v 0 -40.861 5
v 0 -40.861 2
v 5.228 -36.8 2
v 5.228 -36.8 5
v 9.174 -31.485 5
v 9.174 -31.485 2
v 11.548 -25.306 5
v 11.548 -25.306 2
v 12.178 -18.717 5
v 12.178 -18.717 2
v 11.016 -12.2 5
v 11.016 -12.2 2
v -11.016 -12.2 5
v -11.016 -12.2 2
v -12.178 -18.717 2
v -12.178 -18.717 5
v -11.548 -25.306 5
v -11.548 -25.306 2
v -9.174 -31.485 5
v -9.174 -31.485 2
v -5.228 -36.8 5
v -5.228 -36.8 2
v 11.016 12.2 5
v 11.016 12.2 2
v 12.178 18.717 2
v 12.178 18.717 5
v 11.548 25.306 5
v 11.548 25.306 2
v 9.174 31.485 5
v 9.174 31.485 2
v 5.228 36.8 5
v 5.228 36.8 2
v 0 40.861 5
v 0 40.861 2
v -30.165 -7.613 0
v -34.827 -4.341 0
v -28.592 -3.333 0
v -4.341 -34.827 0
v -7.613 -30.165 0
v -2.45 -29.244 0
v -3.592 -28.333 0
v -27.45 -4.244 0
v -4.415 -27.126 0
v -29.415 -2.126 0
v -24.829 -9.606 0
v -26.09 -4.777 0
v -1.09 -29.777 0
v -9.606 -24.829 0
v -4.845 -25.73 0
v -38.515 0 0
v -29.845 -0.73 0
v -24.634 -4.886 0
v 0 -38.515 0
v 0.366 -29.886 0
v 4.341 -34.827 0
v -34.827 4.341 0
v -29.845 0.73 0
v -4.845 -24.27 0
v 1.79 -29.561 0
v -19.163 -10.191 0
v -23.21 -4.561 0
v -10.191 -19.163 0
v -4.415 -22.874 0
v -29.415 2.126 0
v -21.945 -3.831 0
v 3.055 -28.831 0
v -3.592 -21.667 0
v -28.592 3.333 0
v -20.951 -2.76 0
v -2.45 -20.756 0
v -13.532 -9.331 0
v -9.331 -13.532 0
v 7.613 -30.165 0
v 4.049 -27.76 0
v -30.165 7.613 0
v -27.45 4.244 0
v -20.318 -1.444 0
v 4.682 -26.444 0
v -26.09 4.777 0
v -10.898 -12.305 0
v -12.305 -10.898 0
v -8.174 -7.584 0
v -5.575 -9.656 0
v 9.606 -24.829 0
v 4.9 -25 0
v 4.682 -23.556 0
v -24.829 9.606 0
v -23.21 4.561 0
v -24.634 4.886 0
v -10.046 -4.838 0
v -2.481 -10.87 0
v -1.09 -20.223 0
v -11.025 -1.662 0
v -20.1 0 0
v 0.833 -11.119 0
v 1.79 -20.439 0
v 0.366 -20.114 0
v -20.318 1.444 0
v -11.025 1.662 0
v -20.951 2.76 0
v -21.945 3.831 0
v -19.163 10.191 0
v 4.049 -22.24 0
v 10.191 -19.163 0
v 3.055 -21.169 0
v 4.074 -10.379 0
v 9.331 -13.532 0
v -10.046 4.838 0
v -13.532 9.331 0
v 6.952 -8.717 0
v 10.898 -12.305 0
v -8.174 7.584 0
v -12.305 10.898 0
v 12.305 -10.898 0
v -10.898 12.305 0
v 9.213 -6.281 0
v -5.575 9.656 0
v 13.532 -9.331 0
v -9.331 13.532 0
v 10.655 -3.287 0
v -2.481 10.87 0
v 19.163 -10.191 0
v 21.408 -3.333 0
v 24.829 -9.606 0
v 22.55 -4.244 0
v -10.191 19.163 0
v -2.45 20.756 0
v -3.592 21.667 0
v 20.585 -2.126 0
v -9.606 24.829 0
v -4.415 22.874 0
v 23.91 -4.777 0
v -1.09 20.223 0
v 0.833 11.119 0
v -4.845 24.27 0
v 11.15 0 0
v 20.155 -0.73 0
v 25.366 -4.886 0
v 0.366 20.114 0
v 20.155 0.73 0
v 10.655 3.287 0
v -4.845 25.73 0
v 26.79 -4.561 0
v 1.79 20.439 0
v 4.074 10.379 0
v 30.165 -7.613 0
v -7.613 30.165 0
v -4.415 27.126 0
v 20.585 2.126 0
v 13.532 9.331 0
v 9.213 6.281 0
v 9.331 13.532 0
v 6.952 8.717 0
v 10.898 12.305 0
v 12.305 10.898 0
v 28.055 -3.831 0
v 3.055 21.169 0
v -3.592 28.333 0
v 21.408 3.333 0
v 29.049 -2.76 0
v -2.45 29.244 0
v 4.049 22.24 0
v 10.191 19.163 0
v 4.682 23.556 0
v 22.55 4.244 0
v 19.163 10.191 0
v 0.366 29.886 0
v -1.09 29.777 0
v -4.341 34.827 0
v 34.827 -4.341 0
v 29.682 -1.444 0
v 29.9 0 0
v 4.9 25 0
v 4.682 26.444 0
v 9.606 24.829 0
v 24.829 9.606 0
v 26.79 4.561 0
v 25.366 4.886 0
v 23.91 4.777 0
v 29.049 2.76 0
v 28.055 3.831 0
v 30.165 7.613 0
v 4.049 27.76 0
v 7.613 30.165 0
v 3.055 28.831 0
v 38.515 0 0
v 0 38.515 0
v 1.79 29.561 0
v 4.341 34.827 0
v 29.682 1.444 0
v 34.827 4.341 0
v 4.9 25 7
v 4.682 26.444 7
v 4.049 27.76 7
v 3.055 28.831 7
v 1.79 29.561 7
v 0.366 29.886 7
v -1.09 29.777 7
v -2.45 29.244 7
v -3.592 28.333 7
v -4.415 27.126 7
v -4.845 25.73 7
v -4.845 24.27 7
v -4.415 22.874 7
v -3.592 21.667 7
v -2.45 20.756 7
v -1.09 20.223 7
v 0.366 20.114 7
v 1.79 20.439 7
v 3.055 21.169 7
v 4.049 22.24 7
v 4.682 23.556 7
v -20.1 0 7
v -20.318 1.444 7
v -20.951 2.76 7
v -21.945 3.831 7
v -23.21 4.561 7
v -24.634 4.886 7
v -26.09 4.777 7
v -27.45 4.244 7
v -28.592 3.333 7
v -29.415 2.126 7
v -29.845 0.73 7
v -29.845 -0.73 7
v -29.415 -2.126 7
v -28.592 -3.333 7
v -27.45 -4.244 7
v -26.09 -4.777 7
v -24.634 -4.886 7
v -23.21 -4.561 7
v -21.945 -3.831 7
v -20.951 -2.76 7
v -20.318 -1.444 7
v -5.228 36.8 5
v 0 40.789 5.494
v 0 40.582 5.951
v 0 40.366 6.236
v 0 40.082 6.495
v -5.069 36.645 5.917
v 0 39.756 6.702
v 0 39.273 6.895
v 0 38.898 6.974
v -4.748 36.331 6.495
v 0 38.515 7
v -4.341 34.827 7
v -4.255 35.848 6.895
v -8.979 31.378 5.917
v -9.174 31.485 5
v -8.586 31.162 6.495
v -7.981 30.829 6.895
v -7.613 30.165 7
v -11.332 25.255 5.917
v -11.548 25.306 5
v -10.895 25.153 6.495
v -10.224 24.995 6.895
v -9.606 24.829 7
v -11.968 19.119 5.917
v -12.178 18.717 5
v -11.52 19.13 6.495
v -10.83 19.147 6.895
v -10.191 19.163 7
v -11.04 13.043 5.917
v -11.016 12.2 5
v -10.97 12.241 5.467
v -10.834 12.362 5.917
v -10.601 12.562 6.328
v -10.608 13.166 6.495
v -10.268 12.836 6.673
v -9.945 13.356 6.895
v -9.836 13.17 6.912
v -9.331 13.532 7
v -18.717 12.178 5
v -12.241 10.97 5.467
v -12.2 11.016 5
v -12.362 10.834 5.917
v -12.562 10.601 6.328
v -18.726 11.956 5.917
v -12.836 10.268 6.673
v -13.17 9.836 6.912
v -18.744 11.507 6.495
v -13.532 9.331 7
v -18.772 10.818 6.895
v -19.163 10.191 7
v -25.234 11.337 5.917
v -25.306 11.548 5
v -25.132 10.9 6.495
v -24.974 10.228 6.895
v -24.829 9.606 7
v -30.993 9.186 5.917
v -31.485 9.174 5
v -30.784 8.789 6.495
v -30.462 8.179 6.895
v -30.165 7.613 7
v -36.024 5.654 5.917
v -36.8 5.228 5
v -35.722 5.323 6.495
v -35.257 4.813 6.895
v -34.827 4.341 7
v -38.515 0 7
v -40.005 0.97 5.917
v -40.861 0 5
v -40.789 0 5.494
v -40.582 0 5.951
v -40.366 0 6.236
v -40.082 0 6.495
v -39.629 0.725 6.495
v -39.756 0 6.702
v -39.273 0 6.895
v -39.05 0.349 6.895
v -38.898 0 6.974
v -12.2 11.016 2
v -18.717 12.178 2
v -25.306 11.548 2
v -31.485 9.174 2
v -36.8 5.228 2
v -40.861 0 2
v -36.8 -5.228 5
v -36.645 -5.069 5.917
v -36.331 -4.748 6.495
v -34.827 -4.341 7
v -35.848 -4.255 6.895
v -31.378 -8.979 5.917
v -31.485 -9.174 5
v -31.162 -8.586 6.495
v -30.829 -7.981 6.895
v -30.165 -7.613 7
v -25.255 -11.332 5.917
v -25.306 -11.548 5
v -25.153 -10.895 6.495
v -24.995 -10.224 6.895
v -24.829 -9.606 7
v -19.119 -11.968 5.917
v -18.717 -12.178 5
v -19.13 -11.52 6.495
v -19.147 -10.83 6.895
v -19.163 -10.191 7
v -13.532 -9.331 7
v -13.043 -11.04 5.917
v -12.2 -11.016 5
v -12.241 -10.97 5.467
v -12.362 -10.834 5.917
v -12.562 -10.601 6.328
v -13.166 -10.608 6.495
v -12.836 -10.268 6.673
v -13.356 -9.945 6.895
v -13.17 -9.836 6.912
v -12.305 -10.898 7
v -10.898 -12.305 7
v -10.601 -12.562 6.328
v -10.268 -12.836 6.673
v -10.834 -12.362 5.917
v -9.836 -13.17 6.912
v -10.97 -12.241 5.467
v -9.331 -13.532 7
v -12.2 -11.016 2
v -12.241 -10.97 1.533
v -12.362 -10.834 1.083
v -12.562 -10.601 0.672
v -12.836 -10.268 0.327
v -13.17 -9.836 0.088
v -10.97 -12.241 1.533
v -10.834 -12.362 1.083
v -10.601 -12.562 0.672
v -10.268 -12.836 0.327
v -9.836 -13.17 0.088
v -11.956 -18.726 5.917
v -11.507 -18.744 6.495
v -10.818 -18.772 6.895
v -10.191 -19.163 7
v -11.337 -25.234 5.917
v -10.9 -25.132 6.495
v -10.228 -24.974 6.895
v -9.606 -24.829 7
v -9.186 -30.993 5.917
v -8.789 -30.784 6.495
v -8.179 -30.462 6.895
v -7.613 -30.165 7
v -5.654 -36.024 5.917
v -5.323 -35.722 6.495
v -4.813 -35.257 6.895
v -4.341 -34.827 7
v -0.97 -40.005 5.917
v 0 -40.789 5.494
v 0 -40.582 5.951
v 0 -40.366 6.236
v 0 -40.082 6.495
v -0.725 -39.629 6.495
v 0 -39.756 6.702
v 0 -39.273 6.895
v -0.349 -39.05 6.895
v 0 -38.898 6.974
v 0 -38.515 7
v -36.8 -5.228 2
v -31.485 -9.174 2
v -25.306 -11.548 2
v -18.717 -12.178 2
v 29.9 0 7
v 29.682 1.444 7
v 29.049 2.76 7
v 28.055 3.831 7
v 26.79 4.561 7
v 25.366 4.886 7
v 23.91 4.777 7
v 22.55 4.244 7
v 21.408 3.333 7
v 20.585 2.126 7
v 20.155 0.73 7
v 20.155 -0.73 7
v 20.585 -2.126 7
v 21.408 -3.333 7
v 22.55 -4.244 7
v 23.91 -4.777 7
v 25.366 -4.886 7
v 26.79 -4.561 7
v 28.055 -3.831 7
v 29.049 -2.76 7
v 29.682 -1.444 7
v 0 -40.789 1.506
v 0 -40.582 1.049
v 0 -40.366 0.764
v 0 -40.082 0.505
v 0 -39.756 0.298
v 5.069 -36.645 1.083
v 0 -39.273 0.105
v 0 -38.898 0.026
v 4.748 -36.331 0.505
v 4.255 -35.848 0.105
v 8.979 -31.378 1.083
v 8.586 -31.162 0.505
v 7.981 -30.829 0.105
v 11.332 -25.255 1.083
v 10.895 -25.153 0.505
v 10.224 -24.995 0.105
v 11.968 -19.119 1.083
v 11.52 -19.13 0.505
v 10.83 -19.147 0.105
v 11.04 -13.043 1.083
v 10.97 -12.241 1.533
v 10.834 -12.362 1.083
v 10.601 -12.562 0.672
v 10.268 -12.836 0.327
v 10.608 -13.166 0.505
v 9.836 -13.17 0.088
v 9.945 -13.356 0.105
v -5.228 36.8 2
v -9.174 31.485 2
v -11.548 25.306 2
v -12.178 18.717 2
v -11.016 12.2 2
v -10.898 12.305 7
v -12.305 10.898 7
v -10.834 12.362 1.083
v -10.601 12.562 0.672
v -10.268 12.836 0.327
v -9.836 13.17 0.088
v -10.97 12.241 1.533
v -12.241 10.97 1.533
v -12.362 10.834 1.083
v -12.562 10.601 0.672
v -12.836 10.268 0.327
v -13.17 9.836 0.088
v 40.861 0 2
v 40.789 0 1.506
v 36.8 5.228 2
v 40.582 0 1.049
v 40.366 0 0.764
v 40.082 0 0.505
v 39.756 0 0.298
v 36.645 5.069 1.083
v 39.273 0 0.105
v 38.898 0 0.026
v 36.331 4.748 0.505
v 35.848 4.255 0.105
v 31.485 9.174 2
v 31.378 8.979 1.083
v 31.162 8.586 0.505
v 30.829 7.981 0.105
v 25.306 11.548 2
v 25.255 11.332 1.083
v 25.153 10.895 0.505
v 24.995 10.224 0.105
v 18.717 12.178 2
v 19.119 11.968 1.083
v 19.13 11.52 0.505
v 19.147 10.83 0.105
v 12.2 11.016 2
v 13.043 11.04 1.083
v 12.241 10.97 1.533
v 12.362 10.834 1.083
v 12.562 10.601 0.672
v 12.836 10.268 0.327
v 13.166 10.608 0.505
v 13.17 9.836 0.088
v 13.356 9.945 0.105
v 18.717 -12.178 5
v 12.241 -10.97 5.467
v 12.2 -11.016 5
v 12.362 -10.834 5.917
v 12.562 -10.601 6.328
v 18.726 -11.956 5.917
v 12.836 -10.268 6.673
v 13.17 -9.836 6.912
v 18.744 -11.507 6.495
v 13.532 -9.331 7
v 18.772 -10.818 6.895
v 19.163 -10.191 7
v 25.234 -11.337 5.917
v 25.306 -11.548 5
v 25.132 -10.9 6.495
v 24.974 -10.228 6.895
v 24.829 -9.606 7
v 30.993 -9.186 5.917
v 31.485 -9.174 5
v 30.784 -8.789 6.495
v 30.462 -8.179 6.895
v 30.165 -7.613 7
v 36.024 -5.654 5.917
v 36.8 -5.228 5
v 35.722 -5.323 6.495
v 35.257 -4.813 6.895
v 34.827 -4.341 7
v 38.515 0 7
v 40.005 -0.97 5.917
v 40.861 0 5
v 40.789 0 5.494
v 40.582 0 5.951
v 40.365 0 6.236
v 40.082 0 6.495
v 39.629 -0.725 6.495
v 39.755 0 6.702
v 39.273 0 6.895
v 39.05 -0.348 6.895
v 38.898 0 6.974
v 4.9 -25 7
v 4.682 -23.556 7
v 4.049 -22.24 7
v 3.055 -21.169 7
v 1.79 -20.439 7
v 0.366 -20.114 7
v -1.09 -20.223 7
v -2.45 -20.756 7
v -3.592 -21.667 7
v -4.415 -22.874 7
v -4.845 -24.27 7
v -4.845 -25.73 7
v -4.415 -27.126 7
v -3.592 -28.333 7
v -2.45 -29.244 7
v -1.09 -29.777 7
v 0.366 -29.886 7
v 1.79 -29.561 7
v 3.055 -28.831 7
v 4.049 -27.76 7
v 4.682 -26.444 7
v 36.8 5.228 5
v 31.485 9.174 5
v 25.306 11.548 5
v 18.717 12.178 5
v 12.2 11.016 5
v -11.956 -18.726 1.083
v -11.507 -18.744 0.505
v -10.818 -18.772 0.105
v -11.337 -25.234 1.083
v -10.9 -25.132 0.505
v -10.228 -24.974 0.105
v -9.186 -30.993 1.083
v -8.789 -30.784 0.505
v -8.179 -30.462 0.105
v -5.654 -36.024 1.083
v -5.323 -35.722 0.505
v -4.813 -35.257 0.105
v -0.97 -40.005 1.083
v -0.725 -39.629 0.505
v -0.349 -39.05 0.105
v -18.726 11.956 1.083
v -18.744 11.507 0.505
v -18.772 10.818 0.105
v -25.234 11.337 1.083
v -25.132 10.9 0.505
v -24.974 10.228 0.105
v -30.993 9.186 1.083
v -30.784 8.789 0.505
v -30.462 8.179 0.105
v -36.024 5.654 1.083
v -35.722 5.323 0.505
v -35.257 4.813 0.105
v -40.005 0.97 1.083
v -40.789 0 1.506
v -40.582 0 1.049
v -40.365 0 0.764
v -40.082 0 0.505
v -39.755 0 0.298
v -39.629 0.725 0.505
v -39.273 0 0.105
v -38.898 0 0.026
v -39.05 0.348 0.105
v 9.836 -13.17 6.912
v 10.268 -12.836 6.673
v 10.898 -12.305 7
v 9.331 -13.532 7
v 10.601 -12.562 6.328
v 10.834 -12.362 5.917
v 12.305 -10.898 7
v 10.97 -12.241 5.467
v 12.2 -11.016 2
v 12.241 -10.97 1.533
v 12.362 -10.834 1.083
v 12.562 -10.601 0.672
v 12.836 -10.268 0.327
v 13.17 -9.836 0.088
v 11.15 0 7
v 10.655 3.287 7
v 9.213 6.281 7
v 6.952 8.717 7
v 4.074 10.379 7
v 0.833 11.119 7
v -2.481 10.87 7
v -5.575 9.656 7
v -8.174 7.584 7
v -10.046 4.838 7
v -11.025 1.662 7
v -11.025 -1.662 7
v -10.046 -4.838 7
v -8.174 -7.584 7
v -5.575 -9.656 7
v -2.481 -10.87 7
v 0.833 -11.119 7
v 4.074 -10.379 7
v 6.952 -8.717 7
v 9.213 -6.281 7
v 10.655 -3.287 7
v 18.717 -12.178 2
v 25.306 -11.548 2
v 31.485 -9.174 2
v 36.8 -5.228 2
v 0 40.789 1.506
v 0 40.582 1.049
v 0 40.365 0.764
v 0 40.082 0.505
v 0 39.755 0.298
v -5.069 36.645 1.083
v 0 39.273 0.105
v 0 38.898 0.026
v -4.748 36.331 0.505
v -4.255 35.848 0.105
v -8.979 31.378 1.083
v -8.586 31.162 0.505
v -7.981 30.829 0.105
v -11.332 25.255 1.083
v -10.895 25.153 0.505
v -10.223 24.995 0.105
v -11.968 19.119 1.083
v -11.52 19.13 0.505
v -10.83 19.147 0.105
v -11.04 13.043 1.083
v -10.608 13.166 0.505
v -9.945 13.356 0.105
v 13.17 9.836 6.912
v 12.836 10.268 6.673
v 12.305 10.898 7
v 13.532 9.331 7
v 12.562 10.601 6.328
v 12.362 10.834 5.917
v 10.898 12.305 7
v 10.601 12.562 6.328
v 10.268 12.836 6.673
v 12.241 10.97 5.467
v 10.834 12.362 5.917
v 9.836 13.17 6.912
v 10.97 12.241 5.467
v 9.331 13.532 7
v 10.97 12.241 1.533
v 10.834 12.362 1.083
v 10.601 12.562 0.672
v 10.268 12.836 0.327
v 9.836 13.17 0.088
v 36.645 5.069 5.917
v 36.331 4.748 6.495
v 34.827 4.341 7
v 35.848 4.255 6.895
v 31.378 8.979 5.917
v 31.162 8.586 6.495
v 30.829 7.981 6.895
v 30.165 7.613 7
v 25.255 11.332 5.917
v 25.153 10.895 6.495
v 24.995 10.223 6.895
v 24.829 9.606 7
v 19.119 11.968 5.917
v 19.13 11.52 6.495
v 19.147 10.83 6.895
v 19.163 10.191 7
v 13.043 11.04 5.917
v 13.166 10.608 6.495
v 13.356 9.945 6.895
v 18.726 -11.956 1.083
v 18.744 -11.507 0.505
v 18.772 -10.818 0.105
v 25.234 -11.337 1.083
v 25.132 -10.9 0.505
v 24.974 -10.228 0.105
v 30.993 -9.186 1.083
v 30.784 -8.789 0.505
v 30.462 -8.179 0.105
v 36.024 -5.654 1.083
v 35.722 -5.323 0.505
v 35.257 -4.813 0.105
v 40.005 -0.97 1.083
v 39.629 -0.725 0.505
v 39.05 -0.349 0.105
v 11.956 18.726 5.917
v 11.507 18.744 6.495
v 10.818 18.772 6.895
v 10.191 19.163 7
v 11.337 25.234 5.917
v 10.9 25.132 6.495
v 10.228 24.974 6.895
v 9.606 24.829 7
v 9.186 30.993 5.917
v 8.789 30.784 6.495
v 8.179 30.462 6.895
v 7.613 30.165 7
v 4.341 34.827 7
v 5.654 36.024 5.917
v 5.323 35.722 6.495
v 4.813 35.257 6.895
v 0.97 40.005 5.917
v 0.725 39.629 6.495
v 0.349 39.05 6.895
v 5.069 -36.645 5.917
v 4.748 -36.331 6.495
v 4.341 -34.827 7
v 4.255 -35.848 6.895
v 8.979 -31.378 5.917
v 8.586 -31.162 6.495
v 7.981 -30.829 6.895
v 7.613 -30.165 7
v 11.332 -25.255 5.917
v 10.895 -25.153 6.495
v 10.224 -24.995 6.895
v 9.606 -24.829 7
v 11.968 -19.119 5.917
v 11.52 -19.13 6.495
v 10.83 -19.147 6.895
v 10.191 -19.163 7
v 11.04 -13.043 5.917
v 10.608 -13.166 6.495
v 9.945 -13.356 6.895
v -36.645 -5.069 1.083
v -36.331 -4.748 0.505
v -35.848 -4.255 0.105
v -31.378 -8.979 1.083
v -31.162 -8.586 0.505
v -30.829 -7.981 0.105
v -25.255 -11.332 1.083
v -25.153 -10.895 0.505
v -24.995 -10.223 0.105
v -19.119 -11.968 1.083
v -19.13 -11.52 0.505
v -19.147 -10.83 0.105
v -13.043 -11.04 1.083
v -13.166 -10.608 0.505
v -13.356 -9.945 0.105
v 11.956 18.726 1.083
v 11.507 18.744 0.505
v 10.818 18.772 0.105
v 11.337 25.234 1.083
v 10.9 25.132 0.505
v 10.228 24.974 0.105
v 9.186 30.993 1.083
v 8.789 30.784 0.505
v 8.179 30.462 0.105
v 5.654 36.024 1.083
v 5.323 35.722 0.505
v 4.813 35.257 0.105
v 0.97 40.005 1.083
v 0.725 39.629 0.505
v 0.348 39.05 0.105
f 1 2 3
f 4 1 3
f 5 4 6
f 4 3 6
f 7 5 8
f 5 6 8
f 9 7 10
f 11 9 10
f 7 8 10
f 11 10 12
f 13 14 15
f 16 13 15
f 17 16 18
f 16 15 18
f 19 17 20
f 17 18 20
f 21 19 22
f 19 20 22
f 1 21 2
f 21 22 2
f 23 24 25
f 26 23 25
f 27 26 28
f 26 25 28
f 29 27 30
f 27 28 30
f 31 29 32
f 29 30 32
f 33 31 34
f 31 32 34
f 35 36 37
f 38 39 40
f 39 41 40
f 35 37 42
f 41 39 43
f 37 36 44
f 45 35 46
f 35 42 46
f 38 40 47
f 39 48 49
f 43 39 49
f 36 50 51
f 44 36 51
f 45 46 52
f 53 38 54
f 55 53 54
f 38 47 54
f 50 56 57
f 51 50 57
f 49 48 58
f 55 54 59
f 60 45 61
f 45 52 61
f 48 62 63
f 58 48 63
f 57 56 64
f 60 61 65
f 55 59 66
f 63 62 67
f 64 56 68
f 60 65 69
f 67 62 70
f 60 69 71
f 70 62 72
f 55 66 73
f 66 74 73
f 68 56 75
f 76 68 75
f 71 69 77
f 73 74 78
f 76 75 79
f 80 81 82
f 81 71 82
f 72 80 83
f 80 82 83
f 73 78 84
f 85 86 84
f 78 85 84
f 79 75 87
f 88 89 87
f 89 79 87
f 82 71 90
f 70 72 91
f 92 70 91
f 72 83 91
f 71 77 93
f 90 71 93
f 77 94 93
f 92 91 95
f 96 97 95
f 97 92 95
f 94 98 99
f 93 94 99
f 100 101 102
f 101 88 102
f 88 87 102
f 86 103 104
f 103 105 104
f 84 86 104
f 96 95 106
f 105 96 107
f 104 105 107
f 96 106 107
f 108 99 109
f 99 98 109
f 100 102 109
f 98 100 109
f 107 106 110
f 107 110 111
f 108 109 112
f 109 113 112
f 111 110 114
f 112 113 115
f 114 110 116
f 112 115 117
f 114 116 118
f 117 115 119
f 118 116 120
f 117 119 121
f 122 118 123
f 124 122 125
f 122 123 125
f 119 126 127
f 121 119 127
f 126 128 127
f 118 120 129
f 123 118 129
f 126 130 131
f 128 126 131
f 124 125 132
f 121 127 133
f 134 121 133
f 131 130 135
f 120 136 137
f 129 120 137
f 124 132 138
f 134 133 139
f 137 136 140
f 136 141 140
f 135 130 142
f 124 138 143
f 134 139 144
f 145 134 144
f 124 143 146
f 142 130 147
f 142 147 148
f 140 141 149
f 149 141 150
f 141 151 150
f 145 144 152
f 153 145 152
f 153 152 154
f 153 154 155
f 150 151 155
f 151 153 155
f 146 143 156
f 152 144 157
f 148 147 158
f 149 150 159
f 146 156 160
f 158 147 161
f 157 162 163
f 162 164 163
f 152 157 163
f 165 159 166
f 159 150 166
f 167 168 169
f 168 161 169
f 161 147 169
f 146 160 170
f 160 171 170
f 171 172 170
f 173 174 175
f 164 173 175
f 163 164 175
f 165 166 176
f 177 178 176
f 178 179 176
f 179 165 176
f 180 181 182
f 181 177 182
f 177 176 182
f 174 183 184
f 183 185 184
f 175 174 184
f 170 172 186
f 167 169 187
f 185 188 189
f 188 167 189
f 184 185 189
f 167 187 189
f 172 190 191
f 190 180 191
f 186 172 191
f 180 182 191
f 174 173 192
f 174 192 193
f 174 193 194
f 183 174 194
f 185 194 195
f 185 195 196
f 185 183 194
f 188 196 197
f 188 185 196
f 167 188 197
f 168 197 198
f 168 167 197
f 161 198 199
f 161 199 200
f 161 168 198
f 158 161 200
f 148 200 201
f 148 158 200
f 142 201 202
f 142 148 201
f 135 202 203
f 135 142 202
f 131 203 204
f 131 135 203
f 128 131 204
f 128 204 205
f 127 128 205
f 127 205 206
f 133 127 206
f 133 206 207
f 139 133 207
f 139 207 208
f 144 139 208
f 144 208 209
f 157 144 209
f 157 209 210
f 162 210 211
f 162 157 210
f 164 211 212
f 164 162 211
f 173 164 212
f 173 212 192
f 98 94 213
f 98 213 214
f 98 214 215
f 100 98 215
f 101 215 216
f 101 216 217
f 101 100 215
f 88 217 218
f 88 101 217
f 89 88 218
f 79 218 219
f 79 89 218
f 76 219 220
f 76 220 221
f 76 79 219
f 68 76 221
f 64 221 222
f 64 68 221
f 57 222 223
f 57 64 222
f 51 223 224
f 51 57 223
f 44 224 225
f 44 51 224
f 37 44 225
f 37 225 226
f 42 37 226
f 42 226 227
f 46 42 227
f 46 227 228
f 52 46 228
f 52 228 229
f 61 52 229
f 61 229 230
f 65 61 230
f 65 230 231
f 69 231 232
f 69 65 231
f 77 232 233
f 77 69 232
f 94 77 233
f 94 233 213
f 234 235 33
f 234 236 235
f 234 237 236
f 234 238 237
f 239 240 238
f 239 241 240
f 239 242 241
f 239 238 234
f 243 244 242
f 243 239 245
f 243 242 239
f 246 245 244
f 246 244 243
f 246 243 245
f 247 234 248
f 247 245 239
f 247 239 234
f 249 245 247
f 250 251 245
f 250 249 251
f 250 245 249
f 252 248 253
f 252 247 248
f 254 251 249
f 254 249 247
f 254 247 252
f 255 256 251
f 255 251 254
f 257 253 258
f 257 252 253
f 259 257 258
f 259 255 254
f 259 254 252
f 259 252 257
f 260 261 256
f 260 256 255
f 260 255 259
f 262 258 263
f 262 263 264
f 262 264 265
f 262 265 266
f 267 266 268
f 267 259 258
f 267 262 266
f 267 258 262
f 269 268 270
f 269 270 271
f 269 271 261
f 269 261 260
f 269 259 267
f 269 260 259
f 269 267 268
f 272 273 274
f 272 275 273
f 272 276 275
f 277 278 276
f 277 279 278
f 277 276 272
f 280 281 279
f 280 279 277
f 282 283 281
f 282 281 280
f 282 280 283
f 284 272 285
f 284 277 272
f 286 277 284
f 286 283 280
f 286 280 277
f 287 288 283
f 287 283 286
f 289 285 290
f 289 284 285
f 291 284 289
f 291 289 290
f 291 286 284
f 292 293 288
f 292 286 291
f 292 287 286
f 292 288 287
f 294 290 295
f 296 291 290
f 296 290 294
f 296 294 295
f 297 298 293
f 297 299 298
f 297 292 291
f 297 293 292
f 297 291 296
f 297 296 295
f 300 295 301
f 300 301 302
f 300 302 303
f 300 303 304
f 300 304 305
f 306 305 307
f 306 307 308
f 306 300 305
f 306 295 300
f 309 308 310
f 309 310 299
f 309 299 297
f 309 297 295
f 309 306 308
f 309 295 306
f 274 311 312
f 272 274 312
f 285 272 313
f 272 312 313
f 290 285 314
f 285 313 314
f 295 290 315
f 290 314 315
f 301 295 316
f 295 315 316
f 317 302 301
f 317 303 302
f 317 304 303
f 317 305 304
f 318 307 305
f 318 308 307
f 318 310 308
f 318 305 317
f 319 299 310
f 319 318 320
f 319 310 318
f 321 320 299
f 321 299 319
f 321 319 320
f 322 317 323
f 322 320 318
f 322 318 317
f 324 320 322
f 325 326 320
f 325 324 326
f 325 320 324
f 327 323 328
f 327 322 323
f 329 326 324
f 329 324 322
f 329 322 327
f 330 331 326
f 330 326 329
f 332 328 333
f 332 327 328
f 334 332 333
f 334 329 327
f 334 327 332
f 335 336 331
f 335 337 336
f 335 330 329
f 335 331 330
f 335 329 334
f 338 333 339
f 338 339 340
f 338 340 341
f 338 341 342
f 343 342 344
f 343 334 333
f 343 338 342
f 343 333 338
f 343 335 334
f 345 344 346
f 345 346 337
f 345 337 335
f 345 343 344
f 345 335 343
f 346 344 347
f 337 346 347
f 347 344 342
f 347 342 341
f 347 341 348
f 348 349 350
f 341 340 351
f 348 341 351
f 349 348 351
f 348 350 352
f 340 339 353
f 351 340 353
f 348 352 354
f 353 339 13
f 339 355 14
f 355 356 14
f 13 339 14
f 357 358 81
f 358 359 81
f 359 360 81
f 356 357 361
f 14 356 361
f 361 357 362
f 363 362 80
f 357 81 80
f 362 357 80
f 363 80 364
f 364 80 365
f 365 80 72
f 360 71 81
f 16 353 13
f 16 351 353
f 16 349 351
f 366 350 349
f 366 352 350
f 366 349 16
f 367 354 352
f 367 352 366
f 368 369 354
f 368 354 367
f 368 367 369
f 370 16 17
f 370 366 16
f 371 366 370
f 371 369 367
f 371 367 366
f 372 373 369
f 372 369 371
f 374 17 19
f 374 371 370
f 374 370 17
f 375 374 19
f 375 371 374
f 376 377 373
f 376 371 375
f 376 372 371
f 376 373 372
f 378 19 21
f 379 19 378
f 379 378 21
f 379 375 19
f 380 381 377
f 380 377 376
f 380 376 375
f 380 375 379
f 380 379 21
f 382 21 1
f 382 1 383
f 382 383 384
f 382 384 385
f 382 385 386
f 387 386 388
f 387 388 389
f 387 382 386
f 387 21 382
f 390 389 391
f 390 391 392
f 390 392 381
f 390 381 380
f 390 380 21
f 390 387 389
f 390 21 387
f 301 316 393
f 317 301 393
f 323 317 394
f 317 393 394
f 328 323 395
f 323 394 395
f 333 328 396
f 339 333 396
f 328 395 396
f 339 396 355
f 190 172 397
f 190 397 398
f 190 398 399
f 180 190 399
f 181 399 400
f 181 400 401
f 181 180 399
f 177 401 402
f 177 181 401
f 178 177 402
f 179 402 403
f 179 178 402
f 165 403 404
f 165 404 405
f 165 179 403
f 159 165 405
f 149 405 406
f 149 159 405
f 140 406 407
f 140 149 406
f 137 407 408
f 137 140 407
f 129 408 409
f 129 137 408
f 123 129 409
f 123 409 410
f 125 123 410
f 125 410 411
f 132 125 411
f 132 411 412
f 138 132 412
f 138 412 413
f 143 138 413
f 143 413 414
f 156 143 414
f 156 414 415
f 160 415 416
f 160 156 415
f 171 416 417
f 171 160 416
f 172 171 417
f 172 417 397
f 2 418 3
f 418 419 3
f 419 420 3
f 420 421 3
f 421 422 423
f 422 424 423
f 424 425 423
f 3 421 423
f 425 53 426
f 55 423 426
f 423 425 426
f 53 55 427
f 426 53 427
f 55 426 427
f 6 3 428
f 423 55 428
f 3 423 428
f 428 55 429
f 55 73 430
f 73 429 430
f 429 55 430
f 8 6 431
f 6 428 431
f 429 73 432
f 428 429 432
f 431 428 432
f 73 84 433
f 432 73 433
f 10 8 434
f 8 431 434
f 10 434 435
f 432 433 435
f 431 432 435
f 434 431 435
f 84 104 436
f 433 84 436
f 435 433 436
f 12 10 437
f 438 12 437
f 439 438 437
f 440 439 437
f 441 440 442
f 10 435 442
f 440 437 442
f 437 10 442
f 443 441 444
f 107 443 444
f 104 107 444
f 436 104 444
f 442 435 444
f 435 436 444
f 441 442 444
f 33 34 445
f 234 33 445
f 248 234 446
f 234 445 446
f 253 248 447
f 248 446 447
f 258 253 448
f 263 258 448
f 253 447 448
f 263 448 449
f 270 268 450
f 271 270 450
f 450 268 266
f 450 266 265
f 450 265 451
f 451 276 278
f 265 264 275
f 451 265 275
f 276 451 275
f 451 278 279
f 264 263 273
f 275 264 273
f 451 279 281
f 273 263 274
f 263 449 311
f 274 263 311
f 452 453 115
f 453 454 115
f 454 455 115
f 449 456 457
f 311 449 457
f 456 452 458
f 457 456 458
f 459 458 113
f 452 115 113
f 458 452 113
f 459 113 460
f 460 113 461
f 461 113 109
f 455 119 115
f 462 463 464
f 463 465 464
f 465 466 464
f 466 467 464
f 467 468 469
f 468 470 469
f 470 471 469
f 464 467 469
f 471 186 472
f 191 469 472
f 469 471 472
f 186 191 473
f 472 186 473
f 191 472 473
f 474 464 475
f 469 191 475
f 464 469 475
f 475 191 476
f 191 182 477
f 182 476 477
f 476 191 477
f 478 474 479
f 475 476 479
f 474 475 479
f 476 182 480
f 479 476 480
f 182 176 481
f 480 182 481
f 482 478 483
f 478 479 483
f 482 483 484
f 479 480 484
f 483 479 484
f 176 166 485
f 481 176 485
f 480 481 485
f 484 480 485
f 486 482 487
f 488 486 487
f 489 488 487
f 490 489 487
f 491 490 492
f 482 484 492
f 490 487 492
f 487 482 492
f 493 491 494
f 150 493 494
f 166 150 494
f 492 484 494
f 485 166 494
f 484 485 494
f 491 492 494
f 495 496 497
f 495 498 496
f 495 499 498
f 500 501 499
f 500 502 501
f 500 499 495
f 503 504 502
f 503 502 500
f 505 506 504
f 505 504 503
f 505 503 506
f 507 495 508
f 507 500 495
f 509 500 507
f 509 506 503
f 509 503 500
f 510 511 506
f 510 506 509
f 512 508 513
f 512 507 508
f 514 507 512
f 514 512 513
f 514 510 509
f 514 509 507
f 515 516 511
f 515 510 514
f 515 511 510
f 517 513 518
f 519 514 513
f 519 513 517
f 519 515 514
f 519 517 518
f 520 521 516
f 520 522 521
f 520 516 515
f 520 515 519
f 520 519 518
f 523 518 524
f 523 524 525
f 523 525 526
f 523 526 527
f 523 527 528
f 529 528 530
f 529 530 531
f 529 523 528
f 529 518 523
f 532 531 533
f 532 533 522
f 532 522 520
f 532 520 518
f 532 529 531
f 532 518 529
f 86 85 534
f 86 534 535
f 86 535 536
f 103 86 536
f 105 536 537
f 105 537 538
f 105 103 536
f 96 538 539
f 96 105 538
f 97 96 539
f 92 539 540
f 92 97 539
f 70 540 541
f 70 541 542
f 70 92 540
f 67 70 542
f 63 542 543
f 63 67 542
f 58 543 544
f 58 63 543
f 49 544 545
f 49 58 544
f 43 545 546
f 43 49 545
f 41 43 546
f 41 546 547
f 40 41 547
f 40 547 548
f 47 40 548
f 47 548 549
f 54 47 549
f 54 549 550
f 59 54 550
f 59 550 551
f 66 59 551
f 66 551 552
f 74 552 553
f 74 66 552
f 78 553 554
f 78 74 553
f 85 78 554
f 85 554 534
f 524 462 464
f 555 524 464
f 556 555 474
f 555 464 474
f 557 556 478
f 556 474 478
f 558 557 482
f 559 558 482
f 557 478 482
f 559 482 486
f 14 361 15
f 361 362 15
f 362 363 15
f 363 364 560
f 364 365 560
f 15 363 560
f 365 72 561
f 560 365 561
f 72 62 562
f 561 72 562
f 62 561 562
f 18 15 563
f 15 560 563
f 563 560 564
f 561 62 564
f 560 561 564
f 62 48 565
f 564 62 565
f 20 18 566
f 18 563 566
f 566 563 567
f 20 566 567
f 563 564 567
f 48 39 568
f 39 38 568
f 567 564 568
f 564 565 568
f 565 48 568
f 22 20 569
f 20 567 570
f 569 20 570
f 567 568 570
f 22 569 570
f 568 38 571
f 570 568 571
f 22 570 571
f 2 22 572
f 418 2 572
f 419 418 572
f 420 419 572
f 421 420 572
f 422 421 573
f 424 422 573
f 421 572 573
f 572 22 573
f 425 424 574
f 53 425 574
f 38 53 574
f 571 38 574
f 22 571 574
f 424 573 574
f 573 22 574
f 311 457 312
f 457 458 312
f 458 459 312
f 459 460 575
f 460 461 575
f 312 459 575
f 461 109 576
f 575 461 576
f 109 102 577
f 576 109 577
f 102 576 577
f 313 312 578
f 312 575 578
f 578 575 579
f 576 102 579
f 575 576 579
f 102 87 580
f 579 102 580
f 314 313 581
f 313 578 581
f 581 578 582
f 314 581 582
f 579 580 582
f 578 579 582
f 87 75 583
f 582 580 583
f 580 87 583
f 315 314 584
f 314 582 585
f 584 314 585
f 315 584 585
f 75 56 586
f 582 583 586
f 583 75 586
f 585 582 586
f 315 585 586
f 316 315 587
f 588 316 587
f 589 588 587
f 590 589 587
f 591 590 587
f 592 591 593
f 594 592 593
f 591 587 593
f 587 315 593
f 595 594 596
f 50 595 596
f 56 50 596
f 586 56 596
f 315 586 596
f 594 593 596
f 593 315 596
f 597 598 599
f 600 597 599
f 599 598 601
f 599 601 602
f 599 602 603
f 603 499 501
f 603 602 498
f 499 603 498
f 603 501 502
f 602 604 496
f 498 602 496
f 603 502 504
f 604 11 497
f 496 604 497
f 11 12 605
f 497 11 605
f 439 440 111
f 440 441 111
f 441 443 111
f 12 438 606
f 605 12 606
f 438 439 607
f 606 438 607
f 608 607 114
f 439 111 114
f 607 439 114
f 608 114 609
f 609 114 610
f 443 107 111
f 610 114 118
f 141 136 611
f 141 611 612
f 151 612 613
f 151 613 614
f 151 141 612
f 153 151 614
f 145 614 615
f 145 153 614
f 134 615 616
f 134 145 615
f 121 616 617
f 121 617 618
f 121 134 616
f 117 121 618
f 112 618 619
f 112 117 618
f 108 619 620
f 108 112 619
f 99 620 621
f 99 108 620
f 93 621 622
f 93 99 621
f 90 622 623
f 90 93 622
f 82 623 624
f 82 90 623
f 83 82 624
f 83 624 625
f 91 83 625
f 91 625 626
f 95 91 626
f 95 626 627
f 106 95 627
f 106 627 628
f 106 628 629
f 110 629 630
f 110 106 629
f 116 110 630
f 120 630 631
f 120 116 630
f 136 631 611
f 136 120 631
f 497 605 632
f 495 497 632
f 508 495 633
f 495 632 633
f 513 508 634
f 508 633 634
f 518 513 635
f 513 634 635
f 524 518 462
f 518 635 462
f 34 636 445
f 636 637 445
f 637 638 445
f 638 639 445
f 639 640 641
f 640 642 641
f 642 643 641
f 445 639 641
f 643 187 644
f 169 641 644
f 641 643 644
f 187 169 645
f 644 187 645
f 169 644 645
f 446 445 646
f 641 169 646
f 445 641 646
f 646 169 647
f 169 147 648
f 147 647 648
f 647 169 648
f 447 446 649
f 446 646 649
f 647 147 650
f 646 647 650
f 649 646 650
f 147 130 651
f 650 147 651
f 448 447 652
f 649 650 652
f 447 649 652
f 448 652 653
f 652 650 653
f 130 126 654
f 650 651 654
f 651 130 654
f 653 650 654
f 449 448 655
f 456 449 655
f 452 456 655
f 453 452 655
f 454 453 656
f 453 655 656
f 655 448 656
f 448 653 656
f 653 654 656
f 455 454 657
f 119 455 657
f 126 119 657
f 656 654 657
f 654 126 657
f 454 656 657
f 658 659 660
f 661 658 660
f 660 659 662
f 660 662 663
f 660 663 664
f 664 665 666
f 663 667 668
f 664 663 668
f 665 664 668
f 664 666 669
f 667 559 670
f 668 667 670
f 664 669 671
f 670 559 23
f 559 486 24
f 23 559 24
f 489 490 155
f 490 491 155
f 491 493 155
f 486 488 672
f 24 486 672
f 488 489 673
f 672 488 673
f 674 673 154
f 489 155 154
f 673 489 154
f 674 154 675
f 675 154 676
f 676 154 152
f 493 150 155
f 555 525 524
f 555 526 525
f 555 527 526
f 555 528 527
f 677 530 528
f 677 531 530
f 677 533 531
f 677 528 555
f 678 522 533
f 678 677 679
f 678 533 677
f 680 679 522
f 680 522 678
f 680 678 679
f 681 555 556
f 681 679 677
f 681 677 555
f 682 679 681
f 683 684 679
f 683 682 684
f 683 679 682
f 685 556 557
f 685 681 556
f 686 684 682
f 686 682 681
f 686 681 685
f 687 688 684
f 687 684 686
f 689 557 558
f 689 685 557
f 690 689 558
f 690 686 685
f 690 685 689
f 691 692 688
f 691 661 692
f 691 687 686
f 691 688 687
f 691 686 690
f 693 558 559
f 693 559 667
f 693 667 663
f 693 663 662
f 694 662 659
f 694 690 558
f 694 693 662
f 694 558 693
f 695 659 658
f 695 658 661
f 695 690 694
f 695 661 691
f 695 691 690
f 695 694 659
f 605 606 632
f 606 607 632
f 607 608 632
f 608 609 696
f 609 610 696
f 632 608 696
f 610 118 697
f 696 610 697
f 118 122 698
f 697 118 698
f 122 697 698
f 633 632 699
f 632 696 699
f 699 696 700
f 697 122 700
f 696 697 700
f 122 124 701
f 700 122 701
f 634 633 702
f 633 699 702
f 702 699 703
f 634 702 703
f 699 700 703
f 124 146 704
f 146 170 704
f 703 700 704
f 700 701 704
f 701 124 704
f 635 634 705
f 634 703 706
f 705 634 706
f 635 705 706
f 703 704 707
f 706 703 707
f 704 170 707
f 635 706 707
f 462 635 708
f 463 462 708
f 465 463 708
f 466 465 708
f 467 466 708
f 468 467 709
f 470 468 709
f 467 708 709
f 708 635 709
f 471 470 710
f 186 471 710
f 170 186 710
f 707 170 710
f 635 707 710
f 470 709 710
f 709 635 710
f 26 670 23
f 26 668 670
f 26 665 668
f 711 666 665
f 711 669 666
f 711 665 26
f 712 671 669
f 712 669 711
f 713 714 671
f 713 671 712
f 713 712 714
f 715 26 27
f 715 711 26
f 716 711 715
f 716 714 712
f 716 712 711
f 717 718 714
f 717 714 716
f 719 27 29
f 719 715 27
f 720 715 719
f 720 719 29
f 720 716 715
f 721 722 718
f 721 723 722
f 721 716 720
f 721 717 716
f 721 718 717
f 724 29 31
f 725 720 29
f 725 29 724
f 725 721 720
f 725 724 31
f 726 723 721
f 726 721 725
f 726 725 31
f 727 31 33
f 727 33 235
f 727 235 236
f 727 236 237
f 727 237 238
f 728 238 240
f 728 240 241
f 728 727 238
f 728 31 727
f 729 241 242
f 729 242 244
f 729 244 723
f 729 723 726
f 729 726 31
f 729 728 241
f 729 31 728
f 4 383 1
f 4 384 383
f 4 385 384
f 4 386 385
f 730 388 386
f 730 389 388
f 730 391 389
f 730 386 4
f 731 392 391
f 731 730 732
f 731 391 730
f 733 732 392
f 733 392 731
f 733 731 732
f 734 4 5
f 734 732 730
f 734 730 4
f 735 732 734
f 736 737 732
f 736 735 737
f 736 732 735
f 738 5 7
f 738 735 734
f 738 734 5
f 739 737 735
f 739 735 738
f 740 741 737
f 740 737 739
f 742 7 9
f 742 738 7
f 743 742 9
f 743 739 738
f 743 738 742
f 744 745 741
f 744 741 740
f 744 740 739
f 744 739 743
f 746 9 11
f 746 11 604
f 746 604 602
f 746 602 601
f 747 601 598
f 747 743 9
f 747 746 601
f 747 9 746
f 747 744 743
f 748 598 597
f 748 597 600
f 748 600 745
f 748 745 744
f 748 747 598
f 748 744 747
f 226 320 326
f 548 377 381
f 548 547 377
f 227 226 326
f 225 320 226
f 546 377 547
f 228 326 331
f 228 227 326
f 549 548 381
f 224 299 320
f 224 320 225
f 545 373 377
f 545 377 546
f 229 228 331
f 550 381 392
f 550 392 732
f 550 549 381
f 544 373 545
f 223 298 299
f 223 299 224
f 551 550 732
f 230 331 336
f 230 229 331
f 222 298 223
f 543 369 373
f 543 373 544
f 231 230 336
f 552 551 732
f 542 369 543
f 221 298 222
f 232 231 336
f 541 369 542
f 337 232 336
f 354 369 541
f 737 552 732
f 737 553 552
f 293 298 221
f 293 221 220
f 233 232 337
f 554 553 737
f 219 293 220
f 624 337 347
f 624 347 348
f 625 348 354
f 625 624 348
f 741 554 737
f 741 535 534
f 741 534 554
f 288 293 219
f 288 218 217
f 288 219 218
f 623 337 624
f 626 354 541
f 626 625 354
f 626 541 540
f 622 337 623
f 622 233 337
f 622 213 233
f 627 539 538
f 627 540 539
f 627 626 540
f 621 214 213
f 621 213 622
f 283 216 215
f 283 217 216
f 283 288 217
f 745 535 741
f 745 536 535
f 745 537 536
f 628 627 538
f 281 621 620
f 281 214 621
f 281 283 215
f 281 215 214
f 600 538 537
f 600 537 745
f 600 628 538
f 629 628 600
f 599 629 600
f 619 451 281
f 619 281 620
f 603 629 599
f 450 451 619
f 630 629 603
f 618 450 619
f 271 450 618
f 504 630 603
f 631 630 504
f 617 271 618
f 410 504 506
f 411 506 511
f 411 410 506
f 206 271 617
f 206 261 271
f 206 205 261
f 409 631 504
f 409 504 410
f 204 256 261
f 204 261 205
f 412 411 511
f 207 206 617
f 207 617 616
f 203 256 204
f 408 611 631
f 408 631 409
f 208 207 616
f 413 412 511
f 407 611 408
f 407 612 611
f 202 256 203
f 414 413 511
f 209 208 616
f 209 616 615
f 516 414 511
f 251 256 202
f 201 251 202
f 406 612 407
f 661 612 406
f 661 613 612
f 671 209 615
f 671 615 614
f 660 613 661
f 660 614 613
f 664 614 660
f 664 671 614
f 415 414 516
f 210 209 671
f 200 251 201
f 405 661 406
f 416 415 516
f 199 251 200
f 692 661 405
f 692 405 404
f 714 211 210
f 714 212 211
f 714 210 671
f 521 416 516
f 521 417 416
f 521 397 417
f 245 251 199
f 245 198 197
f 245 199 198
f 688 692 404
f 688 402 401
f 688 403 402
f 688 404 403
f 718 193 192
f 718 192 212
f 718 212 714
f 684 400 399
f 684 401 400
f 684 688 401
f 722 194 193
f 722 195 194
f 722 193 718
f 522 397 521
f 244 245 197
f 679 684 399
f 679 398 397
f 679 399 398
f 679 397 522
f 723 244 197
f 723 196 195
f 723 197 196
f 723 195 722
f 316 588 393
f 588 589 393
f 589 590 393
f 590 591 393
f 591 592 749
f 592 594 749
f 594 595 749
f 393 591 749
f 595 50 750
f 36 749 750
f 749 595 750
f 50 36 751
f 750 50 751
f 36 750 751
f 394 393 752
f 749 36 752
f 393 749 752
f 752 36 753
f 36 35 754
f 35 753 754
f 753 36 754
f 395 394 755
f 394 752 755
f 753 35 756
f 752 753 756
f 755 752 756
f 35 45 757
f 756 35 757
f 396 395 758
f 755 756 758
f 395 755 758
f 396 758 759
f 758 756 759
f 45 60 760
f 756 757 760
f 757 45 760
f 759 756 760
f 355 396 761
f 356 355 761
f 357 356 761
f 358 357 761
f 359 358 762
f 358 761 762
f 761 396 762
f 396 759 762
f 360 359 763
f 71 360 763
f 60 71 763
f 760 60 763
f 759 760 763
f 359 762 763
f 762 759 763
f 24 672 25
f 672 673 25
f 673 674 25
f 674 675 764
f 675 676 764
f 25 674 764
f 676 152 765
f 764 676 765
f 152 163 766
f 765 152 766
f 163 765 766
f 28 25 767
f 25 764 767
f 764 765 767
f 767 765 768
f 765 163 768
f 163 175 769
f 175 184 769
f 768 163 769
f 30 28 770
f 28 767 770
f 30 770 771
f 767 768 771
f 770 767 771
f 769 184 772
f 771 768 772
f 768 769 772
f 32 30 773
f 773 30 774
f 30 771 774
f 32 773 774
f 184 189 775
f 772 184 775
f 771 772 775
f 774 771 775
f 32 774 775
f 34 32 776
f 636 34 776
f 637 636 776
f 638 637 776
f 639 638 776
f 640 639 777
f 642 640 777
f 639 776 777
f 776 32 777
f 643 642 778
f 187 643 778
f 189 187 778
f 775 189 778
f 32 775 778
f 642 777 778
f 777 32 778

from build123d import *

# Parameters (mm, degrees)
F0_R     = 11.15
F0_R_2   = 4.9
F0_R_3   = 7.9261864564
F1_DEPTH = 7
F2_R     = 2


with BuildPart() as f1:
    # F0 (on Top) → F1 (new body)
    with BuildSketch(Plane.XY):
        with BuildLine():
            ThreePointArc((12.2001039663, -11.0155566574), (15.3414775392, -5.9011941313), (16.4373059003, 0))
            ThreePointArc((16.4373059003, 0), (15.3414775392, 5.9011941313), (12.2001039663, 11.0155566574))
            ThreePointArc((12.2001039663, 11.0155566574), (11.6229304666, 11.6229304666), (11.0155566574, 12.2001039663))
            ThreePointArc((11.0155566574, 12.2001039663), (0, 16.4373059003), (-11.0155566574, 12.2001039663))
            ThreePointArc((-11.0155566574, 12.2001039663), (-11.6229304666, 11.6229304666), (-12.2001039663, 11.0155566574))
            ThreePointArc((-12.2001039663, 11.0155566574), (-16.4373059003, 0), (-12.2001039663, -11.0155566574))
            ThreePointArc((-12.2001039663, -11.0155566574), (-11.6229304666, -11.6229304666), (-11.0155566574, -12.2001039663))
            ThreePointArc((-11.0155566574, -12.2001039663), (0, -16.4373059003), (11.0155566574, -12.2001039663))
            ThreePointArc((11.0155566574, -12.2001039663), (11.6229304666, -11.6229304666), (12.2001039663, -11.0155566574))
        make_face()
        Circle(F0_R, mode=Mode.SUBTRACT)
        with BuildLine():
            ThreePointArc((-11.0155566574, 12.2001039663), (0, 16.4373059003), (11.0155566574, 12.2001039663))
            ThreePointArc((11.0155566574, 12.2001039663), (10.5712674009, 28.4766709057), (0, 40.8610291779))
            ThreePointArc((0, 40.8610291779), (-10.5712674009, 28.4766709057), (-11.0155566574, 12.2001039663))
        make_face()
        with Locations((0, 25)):
            Circle(F0_R_2, mode=Mode.SUBTRACT)
        with BuildLine():
            ThreePointArc((0, -40.8610291779), (10.5712674009, -28.4766709057), (11.0155566574, -12.2001039663))
            ThreePointArc((11.0155566574, -12.2001039663), (0, -16.4373059003), (-11.0155566574, -12.2001039663))
            ThreePointArc((-11.0155566574, -12.2001039663), (-10.5712674009, -28.4766709057), (0, -40.8610291779))
        make_face()
        with Locations((0, -25)):
            Circle(F0_R_2, mode=Mode.SUBTRACT)
        with BuildLine():
            ThreePointArc((12.2001039663, 11.0155566574), (15.3414775392, 5.9011941313), (16.4373059003, 0))
            ThreePointArc((16.4373059003, 0), (15.3414775392, -5.9011941313), (12.2001039663, -11.0155566574))
            ThreePointArc((12.2001039663, -11.0155566574), (28.4766709057, -10.5712674009), (40.8610291779, 0))
            ThreePointArc((40.8610291779, 0), (28.4766709057, 10.5712674009), (12.2001039663, 11.0155566574))
        make_face()
        with Locations((25, 0)):
            Circle(F0_R_3, mode=Mode.SUBTRACT)
        with BuildLine():
            ThreePointArc((-12.2001039663, -11.0155566574), (-16.4373059003, 0), (-12.2001039663, 11.0155566574))
            ThreePointArc((-12.2001039663, 11.0155566574), (-28.4766709057, 10.5712674009), (-40.8610291779, 0))
            ThreePointArc((-40.8610291779, 0), (-28.4766709057, -10.5712674009), (-12.2001039663, -11.0155566574))
        make_face()
        with Locations((-25, 0)):
            Circle(F0_R_2, mode=Mode.SUBTRACT)
        with Locations((25, 0)):
            Circle(F0_R_3)
        with Locations((25, 0)):
            Circle(F0_R_2, mode=Mode.SUBTRACT)
    extrude(amount=F1_DEPTH)

    # F2
    f2_edges = [f1.edges().sort_by_distance(p)[0] for p in [
        (-10.571267, 28.476671, 7),
        (10.571267, 28.476671, 7),
        (28.476671, -10.571267, 7),
        (28.476671, 10.571267, 7),
        (10.571267, -28.476671, 7),
        (-10.571267, -28.476671, 7),
        (-28.476671, -10.571267, 7),
        (-28.476671, 10.571267, 7),
        (10.571267, 28.476671, 0),
        (-10.571267, 28.476671, 0),
        (-28.476671, 10.571267, 0),
        (-28.476671, -10.571267, 0),
        (10.571267, -28.476671, 0),
        (-10.571267, -28.476671, 0),
        (28.476671, 10.571267, 0),
        (28.476671, -10.571267, 0),
    ]]
    fillet(f2_edges, radius=F2_R)


solid = f1.part
